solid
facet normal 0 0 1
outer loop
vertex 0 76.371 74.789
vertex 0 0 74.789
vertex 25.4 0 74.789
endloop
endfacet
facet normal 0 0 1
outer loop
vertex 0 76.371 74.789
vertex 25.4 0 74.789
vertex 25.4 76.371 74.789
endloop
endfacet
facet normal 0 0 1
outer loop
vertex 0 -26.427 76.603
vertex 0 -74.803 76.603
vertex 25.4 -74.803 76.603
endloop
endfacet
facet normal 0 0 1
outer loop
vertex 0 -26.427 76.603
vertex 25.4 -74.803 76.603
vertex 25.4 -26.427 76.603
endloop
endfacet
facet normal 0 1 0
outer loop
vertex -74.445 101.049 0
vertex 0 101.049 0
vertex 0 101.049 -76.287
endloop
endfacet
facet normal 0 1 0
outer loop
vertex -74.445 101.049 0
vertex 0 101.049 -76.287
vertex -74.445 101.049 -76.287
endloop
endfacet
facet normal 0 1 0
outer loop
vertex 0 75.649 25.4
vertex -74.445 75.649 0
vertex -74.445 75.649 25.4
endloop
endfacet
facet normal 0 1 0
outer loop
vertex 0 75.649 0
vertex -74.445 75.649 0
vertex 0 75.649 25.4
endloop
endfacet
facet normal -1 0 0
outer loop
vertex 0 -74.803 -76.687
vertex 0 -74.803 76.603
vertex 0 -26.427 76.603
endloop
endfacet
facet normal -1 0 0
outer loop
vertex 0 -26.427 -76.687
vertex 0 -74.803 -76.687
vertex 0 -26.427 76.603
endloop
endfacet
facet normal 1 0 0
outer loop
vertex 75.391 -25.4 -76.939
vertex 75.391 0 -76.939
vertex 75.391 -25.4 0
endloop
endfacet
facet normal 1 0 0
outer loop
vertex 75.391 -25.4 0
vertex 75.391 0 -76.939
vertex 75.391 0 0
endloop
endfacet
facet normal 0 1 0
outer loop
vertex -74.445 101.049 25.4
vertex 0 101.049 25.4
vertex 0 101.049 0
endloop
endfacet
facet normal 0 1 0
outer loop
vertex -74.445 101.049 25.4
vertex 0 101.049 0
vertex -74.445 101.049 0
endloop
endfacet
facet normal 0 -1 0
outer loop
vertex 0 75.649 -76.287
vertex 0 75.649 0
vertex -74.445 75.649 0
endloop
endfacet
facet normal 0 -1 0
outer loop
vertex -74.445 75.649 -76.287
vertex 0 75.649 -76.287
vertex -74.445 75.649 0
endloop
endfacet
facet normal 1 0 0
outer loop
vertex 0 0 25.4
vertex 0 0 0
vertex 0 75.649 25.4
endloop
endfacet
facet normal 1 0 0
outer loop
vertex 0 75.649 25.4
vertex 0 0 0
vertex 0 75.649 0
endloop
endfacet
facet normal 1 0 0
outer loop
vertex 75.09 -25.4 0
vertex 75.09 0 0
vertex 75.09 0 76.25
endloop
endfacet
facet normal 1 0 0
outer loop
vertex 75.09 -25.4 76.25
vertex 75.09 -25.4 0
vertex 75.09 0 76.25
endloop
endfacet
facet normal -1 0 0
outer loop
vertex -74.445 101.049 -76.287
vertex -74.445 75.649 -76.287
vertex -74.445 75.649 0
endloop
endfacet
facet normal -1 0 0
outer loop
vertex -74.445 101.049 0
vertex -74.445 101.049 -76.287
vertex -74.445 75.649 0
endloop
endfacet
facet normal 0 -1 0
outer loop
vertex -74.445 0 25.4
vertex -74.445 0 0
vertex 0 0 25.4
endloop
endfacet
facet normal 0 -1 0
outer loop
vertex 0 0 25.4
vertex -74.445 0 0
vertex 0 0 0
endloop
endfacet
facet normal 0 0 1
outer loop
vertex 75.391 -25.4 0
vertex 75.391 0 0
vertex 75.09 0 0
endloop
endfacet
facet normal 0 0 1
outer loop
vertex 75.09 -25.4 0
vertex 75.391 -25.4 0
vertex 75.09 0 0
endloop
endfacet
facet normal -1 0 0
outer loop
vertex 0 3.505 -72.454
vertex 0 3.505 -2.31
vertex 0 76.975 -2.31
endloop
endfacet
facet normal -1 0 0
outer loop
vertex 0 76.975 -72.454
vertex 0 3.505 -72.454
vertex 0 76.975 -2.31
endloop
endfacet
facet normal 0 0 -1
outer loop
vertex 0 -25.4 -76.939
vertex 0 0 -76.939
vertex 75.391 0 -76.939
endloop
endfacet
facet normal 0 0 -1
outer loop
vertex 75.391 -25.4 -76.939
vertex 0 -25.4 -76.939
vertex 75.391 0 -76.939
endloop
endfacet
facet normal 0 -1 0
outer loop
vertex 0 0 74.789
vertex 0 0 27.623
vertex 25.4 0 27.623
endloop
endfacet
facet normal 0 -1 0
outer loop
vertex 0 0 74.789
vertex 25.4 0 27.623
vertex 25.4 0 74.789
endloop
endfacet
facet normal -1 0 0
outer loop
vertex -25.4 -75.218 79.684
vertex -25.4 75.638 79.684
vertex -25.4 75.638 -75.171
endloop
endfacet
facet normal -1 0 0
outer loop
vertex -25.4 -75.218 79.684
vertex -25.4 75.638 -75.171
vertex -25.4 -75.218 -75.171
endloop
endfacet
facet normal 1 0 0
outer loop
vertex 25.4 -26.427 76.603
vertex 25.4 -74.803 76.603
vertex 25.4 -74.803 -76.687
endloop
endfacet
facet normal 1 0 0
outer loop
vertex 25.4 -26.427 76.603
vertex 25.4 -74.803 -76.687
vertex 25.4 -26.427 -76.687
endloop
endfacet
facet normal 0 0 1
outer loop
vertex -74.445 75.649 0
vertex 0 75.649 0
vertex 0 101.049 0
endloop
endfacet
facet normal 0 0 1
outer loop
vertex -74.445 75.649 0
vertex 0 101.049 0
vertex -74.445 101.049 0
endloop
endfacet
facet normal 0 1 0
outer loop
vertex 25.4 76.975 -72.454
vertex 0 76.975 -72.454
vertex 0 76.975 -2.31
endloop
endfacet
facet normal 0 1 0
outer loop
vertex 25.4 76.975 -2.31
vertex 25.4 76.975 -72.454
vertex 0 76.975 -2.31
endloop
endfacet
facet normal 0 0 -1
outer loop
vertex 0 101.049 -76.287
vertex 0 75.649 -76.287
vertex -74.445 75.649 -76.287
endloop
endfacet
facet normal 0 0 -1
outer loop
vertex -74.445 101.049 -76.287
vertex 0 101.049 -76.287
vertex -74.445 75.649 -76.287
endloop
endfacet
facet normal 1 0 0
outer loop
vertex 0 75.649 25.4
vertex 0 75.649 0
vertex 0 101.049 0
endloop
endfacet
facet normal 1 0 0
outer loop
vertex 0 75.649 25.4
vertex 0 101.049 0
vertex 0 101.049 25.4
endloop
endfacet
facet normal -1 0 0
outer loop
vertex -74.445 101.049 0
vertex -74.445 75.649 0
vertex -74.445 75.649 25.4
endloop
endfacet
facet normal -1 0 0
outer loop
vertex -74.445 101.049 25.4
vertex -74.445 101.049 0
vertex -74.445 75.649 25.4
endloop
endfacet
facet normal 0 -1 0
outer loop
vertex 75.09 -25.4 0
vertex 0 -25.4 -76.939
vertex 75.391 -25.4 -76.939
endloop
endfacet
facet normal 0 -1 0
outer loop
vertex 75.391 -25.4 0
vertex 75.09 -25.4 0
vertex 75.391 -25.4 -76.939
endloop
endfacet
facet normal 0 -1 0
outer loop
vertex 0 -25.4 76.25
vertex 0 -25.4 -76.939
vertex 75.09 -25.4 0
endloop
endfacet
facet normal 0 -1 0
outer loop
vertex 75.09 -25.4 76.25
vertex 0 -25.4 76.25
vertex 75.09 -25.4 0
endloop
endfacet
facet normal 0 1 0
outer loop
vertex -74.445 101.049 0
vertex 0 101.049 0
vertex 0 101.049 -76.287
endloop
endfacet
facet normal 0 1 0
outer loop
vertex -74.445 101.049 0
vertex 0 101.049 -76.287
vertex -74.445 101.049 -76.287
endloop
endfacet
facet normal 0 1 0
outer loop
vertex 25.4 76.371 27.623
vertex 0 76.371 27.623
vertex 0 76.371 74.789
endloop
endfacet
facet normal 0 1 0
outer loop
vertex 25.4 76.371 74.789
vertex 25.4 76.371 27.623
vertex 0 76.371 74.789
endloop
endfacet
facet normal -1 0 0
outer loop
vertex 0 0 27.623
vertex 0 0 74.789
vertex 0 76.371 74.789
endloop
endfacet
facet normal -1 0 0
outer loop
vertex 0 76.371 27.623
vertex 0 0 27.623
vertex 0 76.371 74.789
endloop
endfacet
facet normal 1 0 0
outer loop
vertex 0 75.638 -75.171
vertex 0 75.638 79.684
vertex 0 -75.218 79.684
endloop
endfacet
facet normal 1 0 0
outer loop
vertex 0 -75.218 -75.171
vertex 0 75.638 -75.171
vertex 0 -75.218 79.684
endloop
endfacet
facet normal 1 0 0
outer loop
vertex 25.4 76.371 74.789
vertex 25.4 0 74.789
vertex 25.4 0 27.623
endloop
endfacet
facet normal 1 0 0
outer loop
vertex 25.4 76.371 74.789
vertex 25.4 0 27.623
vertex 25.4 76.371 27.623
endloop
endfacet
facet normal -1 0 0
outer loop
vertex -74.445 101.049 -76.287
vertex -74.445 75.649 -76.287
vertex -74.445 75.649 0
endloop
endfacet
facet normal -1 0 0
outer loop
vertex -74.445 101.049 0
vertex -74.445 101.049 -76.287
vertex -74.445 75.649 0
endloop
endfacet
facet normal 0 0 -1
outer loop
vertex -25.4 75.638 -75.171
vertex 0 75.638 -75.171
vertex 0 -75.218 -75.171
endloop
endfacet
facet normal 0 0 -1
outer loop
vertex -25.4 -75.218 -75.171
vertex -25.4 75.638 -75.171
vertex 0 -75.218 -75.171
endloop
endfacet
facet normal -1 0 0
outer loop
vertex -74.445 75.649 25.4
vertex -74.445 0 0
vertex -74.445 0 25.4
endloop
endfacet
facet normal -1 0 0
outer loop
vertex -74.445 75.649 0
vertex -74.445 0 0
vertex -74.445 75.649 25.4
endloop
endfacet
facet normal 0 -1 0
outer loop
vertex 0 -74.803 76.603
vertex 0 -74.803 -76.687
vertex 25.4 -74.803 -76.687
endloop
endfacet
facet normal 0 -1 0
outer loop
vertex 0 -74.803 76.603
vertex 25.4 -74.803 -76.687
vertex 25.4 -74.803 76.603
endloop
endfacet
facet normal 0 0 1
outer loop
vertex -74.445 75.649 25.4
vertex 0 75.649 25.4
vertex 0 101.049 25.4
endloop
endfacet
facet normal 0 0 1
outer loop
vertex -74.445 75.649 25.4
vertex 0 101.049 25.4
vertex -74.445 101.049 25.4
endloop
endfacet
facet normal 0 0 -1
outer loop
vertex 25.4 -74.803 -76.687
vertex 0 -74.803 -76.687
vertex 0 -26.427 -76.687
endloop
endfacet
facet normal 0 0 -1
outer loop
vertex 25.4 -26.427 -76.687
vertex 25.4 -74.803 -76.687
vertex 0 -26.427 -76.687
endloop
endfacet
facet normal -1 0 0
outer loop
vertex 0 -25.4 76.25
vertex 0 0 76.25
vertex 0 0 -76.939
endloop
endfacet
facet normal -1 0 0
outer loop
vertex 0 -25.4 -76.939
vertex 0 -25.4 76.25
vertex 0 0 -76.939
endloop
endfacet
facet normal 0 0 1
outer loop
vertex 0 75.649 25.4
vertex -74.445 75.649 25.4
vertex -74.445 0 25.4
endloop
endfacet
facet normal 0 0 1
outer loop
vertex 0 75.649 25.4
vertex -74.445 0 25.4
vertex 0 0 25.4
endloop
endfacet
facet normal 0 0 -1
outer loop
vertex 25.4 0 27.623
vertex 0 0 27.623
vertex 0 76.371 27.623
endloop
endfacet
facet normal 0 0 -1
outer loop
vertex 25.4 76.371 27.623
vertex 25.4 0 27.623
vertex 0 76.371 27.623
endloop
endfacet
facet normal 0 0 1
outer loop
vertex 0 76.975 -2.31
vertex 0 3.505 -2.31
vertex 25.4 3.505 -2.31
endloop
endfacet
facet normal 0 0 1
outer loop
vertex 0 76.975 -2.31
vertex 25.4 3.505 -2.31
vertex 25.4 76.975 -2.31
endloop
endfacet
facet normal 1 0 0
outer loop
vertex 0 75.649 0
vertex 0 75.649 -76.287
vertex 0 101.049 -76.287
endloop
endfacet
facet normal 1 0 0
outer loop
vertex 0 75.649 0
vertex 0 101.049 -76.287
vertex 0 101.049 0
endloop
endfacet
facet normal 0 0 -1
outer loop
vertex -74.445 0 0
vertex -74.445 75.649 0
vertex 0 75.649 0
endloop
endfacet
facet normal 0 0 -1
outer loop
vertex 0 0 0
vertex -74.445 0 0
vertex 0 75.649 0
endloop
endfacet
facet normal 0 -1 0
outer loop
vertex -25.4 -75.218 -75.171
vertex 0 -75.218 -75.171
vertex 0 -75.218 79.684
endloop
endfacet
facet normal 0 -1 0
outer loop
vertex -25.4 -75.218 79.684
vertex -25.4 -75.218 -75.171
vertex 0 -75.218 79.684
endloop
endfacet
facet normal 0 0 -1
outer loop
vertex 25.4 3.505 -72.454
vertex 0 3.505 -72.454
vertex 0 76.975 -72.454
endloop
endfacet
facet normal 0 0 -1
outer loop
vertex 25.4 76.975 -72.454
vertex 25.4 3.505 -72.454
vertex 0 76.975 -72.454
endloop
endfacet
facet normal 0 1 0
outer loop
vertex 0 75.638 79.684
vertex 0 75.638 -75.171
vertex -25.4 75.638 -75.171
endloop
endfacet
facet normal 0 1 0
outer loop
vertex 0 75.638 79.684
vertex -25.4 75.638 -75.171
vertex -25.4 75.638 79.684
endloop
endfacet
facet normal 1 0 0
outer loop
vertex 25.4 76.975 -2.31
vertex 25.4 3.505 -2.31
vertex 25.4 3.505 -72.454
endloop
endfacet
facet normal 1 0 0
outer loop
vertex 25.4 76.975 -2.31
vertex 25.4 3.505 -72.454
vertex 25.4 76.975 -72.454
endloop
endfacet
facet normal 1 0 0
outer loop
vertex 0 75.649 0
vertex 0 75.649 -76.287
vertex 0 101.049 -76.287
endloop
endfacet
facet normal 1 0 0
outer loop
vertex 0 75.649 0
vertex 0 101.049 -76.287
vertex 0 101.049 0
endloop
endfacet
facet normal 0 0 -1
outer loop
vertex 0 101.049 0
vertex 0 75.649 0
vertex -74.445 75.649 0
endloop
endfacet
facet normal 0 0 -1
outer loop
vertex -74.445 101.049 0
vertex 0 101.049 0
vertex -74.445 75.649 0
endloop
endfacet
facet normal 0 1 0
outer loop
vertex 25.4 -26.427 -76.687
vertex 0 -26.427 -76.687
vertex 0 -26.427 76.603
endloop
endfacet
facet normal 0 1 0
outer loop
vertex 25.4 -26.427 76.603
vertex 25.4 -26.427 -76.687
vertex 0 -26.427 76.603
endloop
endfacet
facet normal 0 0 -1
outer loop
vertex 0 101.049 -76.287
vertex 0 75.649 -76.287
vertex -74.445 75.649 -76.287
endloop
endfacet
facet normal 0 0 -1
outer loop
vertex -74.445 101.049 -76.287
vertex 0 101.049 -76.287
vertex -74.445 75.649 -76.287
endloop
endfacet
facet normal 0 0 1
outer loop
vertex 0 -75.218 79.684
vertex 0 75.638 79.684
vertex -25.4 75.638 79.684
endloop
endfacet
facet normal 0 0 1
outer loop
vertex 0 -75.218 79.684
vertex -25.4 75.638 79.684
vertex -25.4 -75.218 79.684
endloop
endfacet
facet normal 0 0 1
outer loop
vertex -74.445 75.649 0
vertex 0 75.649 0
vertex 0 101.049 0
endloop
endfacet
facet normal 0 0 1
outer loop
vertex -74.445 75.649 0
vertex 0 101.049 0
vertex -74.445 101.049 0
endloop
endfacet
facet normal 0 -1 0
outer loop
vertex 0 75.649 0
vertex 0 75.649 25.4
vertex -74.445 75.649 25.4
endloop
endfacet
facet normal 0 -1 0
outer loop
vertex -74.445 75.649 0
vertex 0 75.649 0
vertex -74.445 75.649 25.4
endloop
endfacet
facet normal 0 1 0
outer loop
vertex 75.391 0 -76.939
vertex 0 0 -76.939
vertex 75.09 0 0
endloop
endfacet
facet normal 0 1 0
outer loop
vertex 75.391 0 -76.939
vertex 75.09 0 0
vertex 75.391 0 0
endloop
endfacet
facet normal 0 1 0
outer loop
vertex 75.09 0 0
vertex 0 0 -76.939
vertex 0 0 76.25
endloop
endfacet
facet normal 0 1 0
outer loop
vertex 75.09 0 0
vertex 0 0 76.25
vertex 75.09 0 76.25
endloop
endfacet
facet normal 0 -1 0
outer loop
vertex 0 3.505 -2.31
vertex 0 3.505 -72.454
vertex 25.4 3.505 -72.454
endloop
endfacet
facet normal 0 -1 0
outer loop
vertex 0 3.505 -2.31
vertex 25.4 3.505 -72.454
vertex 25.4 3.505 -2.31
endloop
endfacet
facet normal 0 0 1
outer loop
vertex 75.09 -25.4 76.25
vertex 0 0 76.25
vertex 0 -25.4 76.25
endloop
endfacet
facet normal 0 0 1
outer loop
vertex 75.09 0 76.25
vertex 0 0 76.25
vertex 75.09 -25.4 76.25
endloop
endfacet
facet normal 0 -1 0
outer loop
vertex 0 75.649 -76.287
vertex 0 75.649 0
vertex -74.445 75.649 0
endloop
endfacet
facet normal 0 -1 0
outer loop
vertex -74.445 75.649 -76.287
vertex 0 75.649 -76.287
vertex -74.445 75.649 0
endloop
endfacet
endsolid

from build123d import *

# Parameters (mm, degrees)
F0_W      = 74.4453966618
F0_H      = 75.6485536695
F1_DEPTH  = 25.4
F3_W      = 74.4453966618
F3_H      = 76.2866288424
F4_DEPTH  = 25.4
F2_W      = 74.4453966618
F2_H      = 25.4
F5_DEPTH  = 25.4
F6_W      = 75.0896334648
F6_H      = 76.2501582503
F7_DEPTH  = 25.4
F8_W      = 48.3754314482
F8_H      = 153.2896459103
F9_DEPTH  = 25.4
F8_W_2    = 76.3705521822
F8_H_2    = 47.1660438925
F8_W_3    = 73.4701931942
F8_H_3    = 70.1443727594
F10_W     = 150.8555859327
F10_H     = 154.8547893763
F11_DEPTH = 25.4


with BuildPart() as f1:
    # F0 (on Top) → F1 (new body)
    with BuildSketch(Plane.XY):
        with Locations((-37.2226983309, 37.8242768347)):
            Rectangle(F0_W, F0_H)
    extrude(amount=F1_DEPTH)


with BuildPart() as f4:
    # F3 (on face) → F4 (new body)
    with BuildSketch(Plane(origin=(0, 75.6485536695, 0), x_dir=(-1, 0, 0), z_dir=(0, 1, 0))):
        with Locations((37.2226983309, -38.1433144212)):
            Rectangle(F3_W, F3_H)
    extrude(amount=F4_DEPTH)


with BuildPart() as f5:
    # F2 (on face) → F5 (new body)
    with BuildSketch(Plane(origin=(0, 75.6485536695, 0), x_dir=(-1, 0, 0), z_dir=(0, 1, 0))):
        with Locations((37.2226983309, 12.7)):
            Rectangle(F2_W, F2_H)
    extrude(amount=F5_DEPTH)


with BuildPart() as f5b:
    # F3 (on face) → F5, piece 2 (new body)
    with BuildSketch(Plane(origin=(0, 75.6485536695, 0), x_dir=(-1, 0, 0), z_dir=(0, 1, 0))):
        with Locations((37.2226983309, -38.1433144212)):
            Rectangle(F3_W, F3_H)
    extrude(amount=F5_DEPTH)


with BuildPart() as f7:
    # F6 (on Front) → F7 (new body)
    with BuildSketch(Plane.XZ):
        with Locations((37.5448167324, 38.1250791252)):
            Rectangle(F6_W, F6_H)
        Polygon((75.0896334648, 0), (0, 0), (0, -76.9387111068), (75.3905922174, -76.9387111068), (75.3905922174, 0), align=None)
    extrude(amount=F7_DEPTH)


with BuildPart() as f9:
    # F8 (on Right) → F9 (new body)
    with BuildSketch(Plane.YZ):
        with Locations((-50.614958629, -0.0419318676)):
            Rectangle(F8_W, F8_H)
    extrude(amount=F9_DEPTH)


with BuildPart() as f9b:
    # F8 (on Right) → F9, piece 2 (new body)
    with BuildSketch(Plane.YZ):
        with Locations((38.1852760911, 51.205794327)):
            Rectangle(F8_W_2, F8_H_2)
    extrude(amount=F9_DEPTH)


with BuildPart() as f9c:
    # F8 (on Right) → F9, piece 3 (new body)
    with BuildSketch(Plane.YZ):
        with Locations((40.2401521569, -37.381714792)):
            Rectangle(F8_W_3, F8_H_3)
    extrude(amount=F9_DEPTH)


with BuildPart() as f11:
    # F10 (on face) → F11 (new body)
    with BuildSketch(Plane(origin=(0, 0, 0), x_dir=(0, -1, 0), z_dir=(-1, 0, 0))):
        with Locations((-0.210121274, 2.2564306855)):
            Rectangle(F10_W, F10_H)
    extrude(amount=F11_DEPTH)


solid = Compound([f1.part, f4.part, f5.part, f5b.part, f7.part, f9.part, f9b.part, f9c.part, f11.part])
